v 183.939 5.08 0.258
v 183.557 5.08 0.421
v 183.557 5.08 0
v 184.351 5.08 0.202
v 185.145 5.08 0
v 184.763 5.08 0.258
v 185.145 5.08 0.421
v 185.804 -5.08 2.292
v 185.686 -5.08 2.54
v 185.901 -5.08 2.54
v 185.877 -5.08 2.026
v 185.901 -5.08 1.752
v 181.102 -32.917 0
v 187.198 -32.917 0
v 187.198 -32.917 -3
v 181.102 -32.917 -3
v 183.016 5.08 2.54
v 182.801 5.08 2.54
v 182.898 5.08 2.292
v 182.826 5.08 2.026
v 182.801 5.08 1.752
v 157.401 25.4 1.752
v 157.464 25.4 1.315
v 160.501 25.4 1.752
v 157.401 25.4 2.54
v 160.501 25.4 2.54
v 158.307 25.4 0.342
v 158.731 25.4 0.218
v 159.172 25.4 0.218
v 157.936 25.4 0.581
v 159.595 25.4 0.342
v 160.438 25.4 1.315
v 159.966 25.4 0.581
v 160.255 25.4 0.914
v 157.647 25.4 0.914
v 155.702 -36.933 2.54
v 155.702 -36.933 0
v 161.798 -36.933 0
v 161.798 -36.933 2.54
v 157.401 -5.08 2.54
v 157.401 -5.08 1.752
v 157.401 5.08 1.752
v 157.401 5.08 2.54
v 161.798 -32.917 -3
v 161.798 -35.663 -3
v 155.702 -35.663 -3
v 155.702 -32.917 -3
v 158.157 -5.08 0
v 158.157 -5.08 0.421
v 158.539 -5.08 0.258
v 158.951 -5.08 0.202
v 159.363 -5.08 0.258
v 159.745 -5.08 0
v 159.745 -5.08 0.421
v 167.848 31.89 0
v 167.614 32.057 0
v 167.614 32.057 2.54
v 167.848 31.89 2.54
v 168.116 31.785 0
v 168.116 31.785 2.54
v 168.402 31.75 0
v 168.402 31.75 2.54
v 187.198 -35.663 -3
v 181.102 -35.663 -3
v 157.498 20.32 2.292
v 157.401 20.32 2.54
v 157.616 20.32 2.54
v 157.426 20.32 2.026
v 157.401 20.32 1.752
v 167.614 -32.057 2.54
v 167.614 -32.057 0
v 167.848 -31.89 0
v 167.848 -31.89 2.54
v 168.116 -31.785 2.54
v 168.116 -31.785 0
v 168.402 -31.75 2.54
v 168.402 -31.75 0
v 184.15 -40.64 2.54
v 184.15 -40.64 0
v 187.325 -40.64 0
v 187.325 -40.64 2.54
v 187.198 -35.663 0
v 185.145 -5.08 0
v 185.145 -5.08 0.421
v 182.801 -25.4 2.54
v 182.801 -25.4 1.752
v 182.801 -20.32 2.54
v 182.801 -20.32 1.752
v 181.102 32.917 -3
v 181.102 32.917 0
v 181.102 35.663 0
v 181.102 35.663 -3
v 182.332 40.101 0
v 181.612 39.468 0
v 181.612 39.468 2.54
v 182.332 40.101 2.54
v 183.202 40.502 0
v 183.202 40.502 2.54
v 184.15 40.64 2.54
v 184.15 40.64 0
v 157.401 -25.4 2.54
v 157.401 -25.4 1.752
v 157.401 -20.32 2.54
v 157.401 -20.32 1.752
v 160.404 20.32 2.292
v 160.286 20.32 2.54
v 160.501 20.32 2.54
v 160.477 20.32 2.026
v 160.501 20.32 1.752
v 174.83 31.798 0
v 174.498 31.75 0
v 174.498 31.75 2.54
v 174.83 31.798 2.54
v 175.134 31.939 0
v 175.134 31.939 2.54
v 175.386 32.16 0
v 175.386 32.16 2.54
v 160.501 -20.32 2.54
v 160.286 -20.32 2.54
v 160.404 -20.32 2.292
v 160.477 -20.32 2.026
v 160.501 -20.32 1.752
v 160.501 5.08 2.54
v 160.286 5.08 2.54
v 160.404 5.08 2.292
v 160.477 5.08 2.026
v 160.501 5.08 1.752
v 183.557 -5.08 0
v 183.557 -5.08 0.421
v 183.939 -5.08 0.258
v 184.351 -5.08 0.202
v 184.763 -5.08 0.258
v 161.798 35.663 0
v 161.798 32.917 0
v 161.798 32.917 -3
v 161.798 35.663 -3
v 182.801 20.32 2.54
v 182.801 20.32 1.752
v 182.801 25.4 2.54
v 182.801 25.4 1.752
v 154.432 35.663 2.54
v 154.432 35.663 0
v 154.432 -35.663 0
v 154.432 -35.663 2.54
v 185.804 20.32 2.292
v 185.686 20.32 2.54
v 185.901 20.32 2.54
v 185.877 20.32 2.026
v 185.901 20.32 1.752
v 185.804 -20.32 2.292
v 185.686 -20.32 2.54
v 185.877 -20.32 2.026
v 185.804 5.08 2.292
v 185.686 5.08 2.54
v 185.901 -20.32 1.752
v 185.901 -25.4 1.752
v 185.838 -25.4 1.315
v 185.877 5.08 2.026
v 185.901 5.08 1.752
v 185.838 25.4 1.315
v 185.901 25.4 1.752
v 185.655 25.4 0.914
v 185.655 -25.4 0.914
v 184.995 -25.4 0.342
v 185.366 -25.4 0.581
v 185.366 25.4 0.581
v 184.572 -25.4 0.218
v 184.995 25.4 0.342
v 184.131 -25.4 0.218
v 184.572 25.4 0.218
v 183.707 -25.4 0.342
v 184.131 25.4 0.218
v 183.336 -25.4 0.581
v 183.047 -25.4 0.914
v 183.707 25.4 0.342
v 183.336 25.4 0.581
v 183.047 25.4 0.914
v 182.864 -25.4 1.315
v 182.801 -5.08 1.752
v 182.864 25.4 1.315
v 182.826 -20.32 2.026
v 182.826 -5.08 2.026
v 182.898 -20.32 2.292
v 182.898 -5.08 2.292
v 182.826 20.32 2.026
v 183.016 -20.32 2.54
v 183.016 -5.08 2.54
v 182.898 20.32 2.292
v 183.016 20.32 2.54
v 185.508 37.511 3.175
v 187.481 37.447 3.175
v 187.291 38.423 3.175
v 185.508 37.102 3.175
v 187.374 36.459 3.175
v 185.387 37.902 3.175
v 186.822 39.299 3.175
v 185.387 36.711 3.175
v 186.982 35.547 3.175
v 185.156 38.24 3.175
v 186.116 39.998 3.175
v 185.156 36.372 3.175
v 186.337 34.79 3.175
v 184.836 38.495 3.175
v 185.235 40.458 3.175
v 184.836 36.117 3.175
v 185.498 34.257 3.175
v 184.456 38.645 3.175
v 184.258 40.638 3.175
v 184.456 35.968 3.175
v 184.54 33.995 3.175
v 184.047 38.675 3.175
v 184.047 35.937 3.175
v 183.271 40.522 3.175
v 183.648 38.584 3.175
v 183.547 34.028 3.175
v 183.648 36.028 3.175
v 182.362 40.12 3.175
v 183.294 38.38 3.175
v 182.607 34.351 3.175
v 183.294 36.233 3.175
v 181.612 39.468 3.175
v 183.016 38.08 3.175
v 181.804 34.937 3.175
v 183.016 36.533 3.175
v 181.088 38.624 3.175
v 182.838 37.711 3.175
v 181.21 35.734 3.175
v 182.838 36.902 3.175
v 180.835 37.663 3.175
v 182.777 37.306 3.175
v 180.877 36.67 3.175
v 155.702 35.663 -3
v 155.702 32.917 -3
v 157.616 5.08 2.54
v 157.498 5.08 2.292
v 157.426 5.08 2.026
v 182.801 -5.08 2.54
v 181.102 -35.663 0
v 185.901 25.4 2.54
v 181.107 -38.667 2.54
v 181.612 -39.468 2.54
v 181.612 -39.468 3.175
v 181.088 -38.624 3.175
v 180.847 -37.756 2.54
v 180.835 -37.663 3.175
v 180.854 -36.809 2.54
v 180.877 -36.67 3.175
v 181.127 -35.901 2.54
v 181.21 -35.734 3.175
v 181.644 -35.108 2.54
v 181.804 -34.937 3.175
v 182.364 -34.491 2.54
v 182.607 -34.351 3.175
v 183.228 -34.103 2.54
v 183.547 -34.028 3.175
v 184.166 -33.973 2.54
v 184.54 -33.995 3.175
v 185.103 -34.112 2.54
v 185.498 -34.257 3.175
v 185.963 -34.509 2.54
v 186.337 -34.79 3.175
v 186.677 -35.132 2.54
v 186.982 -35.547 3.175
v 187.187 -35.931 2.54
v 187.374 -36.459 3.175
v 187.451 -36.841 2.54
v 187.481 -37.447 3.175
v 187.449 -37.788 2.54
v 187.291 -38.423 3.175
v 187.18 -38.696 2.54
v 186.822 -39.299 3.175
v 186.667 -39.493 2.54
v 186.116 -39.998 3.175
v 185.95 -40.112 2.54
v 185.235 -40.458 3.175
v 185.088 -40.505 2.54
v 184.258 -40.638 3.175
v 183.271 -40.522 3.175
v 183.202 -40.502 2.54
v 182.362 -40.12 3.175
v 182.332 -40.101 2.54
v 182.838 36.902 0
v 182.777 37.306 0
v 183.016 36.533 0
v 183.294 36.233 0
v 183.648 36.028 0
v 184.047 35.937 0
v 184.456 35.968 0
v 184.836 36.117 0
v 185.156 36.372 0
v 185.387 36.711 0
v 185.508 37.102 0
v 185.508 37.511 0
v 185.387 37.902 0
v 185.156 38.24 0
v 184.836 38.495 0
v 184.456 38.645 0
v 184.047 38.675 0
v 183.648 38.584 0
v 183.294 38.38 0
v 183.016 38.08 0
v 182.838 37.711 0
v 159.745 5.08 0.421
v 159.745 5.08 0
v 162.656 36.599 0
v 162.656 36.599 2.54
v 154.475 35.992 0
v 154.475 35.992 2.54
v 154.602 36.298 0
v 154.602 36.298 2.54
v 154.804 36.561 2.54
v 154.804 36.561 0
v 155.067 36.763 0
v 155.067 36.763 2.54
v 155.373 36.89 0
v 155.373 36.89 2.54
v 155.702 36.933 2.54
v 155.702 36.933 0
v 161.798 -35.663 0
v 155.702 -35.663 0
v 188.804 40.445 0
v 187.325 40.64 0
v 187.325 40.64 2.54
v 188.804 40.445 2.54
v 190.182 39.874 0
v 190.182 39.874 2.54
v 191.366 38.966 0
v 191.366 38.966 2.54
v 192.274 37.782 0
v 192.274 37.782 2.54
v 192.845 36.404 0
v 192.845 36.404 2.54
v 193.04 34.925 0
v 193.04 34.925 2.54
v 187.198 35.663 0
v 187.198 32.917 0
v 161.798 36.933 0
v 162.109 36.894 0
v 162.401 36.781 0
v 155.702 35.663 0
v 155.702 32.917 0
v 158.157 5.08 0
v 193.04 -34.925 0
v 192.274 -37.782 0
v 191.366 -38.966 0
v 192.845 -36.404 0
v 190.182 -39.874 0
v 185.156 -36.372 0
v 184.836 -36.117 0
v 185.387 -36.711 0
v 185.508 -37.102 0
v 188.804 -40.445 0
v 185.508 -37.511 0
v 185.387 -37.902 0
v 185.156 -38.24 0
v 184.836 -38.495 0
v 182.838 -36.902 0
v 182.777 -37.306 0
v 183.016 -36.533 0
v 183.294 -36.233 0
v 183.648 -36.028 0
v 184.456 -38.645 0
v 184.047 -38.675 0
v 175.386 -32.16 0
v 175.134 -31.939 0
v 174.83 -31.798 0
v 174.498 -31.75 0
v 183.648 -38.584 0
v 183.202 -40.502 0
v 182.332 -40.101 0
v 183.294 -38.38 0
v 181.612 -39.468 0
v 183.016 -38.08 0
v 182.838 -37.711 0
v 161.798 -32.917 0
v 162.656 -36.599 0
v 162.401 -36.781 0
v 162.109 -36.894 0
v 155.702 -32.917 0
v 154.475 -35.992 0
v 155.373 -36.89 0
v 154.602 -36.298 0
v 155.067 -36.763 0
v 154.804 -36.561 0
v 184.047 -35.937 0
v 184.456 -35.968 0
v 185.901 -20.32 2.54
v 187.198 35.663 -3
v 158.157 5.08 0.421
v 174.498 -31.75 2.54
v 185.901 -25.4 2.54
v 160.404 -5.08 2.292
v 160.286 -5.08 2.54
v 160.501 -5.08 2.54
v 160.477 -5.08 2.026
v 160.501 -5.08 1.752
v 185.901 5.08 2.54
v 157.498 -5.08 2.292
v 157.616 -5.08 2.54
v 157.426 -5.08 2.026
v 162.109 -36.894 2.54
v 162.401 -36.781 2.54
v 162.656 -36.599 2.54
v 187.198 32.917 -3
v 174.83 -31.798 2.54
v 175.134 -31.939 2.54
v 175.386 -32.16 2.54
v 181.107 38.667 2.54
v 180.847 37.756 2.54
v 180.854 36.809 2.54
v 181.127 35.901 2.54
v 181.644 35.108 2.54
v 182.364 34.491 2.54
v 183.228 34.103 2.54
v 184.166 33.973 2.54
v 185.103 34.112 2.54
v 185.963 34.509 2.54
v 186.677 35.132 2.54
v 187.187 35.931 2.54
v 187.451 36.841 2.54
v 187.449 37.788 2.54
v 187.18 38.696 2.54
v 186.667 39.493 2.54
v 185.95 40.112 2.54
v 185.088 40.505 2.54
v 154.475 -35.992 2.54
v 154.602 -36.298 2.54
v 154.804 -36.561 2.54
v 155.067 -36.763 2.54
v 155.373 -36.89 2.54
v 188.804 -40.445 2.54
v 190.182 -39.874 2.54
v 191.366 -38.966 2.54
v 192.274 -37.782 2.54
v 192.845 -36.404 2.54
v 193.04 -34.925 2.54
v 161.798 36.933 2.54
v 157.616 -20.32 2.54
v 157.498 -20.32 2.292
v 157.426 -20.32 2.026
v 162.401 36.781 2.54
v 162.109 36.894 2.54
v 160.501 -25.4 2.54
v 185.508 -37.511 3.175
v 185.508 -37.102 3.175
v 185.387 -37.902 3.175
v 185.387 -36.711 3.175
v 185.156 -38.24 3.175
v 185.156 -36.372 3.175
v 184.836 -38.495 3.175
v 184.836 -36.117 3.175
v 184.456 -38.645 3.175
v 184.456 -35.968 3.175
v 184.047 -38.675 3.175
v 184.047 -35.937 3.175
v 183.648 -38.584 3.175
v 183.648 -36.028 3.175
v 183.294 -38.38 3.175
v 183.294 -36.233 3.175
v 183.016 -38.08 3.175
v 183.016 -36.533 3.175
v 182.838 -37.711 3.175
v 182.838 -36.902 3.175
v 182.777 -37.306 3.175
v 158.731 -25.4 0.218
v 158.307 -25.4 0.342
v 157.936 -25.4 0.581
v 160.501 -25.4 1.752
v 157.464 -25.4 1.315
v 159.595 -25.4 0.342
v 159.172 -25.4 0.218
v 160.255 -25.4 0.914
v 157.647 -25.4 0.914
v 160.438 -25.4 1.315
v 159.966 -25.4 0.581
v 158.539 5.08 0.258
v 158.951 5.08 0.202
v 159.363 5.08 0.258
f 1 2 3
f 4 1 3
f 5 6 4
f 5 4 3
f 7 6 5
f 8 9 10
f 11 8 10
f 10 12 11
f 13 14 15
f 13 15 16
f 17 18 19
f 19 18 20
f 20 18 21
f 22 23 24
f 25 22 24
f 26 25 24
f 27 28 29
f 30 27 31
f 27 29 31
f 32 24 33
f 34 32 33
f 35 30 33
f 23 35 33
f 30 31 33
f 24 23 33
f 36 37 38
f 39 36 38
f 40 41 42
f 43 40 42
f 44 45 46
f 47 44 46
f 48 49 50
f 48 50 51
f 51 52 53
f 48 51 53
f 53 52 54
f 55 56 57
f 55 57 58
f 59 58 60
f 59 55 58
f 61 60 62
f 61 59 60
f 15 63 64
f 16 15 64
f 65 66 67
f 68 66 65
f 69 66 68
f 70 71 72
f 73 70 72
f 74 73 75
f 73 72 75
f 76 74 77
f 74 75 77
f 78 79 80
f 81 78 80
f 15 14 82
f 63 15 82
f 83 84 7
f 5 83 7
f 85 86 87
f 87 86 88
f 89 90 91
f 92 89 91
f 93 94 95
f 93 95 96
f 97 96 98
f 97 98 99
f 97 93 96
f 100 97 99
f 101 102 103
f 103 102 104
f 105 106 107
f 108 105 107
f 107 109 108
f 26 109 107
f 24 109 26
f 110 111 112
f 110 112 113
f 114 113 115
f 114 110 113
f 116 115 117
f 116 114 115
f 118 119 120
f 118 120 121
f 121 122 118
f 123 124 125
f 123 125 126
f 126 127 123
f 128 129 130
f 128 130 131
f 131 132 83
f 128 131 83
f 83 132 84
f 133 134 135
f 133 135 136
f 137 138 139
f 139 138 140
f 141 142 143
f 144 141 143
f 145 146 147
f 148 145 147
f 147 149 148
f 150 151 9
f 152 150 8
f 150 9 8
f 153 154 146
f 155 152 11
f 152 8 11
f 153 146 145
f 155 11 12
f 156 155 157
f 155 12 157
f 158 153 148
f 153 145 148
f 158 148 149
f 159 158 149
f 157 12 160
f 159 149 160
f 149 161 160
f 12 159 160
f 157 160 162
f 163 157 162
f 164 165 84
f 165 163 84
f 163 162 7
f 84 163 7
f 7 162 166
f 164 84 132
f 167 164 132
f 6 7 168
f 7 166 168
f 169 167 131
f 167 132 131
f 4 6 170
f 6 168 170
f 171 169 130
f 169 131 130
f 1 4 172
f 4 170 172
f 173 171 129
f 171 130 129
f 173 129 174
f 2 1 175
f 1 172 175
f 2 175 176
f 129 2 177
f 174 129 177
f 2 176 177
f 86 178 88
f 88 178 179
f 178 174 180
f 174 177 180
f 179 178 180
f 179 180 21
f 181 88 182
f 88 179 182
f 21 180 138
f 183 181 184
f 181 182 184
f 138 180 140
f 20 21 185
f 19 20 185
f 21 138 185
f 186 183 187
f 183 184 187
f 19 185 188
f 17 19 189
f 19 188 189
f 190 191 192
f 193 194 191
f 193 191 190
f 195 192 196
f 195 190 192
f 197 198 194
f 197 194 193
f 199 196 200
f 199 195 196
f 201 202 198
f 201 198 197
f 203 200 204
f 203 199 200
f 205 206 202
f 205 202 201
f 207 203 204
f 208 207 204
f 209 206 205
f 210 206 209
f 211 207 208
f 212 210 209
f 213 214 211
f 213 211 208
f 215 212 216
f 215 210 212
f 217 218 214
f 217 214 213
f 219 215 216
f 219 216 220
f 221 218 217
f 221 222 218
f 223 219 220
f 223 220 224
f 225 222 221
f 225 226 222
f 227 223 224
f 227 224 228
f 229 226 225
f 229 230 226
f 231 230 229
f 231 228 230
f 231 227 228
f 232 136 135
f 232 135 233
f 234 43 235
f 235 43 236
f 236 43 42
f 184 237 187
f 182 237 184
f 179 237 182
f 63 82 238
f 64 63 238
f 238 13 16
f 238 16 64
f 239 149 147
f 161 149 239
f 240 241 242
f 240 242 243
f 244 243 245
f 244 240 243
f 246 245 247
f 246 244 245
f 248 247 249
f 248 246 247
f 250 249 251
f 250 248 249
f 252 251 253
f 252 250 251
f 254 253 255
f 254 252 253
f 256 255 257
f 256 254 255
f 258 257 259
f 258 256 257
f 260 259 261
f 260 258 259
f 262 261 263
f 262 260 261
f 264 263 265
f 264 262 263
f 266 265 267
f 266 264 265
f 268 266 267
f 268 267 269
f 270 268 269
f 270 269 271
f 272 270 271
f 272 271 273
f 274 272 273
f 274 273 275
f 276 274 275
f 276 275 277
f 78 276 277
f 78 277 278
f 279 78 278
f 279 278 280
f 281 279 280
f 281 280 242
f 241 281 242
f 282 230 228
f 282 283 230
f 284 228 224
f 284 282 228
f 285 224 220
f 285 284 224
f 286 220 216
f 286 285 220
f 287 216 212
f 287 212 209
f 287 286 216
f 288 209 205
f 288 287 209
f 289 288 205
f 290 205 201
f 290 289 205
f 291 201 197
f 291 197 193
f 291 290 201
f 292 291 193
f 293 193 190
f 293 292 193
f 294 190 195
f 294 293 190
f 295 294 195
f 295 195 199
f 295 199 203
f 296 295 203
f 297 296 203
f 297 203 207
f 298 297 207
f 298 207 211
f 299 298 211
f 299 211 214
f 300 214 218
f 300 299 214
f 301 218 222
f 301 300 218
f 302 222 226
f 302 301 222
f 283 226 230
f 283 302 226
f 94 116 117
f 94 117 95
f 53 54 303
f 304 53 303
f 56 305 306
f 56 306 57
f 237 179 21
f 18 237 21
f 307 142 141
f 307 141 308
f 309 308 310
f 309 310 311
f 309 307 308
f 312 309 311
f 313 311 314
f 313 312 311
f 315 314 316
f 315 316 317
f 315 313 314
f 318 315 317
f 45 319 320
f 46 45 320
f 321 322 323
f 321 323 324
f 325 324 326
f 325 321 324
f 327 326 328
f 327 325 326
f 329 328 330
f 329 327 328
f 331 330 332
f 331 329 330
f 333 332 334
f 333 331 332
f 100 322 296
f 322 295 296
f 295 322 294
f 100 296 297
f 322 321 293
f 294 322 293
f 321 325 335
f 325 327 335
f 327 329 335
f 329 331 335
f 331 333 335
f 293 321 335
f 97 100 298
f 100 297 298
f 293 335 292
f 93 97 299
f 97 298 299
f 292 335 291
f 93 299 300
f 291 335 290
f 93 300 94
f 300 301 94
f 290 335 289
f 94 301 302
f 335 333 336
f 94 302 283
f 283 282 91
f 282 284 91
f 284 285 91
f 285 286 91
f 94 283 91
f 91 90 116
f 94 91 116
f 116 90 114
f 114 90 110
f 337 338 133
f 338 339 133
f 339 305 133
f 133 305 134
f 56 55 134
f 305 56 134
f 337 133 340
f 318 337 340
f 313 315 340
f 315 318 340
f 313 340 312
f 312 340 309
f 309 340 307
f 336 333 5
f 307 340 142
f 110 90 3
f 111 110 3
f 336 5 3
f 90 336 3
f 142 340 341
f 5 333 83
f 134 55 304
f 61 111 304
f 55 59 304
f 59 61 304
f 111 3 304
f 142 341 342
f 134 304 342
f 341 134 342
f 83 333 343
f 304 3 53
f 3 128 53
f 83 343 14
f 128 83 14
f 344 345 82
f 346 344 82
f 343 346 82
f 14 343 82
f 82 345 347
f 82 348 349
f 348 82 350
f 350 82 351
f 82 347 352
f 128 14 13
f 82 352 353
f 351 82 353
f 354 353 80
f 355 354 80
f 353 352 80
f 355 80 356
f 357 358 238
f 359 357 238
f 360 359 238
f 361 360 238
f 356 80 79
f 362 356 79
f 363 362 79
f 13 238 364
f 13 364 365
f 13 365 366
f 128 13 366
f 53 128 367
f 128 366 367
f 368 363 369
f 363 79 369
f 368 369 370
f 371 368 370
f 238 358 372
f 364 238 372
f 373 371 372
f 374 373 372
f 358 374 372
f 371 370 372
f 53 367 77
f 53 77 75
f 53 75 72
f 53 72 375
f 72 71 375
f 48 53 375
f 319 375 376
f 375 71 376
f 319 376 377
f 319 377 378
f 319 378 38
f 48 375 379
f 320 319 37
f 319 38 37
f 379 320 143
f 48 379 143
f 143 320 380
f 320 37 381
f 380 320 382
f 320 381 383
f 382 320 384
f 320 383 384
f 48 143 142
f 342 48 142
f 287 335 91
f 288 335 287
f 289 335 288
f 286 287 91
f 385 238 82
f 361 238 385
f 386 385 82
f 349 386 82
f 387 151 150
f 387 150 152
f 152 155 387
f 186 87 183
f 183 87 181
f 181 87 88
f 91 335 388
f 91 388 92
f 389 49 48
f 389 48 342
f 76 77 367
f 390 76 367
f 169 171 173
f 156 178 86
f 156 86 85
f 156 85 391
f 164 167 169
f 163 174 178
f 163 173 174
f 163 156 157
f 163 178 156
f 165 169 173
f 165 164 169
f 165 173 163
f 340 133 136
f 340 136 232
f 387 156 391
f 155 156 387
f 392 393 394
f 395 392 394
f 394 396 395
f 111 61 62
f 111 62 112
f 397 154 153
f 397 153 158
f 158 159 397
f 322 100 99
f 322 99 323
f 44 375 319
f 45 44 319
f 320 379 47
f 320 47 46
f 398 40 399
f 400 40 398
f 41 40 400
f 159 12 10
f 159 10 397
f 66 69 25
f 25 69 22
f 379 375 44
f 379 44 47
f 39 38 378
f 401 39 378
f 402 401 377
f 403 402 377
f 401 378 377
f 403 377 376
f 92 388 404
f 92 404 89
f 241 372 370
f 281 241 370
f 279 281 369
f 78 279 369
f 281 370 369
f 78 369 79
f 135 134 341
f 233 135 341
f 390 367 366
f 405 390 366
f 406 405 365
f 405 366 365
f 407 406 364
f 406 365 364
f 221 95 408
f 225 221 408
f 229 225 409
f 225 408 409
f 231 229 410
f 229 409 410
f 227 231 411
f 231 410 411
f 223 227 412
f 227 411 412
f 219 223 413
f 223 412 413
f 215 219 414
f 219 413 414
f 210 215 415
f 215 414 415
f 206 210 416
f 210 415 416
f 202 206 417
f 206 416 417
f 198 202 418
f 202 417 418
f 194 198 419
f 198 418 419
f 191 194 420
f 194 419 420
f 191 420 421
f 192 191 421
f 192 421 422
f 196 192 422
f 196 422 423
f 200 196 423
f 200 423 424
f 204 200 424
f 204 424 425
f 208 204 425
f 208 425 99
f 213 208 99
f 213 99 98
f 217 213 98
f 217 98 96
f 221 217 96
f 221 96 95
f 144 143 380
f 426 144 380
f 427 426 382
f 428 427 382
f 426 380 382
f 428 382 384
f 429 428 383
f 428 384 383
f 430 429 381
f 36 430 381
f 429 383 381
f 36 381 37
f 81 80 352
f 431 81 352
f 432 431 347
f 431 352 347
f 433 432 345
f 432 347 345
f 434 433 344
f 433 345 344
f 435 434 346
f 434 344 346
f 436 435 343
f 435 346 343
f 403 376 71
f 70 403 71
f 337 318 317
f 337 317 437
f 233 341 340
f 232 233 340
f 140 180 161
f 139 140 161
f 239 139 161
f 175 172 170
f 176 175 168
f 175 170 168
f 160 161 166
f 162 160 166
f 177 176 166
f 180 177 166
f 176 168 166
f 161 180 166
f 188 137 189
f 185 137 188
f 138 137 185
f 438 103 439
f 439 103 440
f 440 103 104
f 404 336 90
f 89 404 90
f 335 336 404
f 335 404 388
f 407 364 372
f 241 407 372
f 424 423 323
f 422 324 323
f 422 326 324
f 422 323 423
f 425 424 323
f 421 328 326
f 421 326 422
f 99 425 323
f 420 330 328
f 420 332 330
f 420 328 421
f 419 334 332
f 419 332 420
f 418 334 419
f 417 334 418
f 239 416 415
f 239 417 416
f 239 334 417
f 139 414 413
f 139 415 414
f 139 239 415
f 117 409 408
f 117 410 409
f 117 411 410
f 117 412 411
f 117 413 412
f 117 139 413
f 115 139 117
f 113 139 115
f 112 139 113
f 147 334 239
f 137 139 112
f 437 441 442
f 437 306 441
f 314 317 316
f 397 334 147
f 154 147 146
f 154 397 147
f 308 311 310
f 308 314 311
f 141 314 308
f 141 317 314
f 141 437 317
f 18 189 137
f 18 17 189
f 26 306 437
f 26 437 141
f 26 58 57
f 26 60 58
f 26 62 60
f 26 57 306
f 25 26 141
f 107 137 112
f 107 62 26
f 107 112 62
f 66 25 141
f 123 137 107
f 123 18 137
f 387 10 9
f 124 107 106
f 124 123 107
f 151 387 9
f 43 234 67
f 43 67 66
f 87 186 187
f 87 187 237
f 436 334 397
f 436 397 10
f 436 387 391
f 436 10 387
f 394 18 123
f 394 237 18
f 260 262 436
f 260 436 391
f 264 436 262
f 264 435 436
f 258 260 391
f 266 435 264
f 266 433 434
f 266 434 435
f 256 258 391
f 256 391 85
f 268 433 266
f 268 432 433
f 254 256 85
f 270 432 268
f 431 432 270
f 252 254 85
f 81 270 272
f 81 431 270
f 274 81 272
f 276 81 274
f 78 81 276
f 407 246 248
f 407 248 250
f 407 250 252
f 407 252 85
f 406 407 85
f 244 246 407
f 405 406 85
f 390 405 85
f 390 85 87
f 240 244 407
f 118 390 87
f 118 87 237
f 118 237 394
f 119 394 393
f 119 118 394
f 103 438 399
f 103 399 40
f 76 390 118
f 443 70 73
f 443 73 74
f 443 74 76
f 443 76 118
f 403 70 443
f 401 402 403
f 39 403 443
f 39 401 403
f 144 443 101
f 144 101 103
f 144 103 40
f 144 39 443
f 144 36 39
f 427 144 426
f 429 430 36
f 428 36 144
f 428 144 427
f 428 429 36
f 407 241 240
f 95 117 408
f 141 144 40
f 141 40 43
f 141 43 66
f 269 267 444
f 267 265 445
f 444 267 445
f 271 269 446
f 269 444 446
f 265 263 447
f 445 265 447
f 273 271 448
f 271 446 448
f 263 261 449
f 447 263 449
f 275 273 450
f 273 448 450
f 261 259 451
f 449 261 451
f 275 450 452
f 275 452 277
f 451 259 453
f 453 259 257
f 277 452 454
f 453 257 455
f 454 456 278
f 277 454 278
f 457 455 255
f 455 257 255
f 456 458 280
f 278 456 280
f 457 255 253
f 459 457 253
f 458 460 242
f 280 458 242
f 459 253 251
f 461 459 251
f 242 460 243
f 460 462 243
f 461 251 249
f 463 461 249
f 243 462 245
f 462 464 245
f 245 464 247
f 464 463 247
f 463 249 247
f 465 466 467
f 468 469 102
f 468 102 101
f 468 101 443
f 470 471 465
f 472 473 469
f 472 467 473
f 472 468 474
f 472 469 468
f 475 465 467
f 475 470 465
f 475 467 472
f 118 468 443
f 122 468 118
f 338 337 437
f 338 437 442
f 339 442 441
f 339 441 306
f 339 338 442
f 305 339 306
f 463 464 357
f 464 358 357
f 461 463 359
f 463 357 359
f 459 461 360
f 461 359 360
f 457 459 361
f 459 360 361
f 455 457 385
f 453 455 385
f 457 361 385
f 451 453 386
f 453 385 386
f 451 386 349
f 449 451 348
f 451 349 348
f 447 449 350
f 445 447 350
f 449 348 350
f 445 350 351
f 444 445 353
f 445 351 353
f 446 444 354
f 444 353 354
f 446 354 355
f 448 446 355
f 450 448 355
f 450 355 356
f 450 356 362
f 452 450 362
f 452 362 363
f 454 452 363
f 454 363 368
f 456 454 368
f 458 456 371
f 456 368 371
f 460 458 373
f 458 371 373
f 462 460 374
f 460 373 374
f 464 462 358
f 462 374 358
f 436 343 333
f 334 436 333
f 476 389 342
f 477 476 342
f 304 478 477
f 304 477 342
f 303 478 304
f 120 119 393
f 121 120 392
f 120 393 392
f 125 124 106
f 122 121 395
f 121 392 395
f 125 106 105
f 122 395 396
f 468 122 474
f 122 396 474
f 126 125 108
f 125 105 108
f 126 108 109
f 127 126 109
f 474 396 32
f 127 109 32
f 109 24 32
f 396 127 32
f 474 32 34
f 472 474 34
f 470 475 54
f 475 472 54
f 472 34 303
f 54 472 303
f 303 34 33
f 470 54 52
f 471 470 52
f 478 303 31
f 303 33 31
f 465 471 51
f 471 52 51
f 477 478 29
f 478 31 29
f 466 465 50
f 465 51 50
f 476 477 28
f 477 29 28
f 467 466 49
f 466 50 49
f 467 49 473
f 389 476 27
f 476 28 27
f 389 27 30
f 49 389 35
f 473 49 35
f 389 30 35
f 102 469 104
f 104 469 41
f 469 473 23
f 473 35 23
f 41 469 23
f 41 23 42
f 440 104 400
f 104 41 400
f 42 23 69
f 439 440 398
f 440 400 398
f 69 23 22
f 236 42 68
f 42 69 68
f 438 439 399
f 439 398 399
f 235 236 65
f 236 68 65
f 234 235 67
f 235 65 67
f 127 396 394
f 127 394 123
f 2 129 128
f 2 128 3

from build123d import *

# Parameters (mm, degrees)
SKETCH3_R           = 1.373
DOWEL_BODIES_DEPTH  = 13
BOSS_EXTRUDE3_DEPTH = 2.54
SKETCH5_W           = 6.096
SKETCH5_H           = 2.746000096
BOSS_EXTRUDE4_DEPTH = 3
SKETCH6_R           = 3.33375
SKETCH6_R_2         = 1.373
BOSS_EXTRUDE7_DEPTH = 0.635
SKETCH8_R           = 1.55
CUT_EXTRUDE1_DEPTH  = 25.4
CUT_EXTRUDE2_REACH  = 199.349
SKETCH9_W           = 1.5875
SKETCH9_H           = 10.16
CUT_EXTRUDE3_START  = -0.788
SKETCH10_W          = 3.1
SKETCH10_H          = 5.08
SKETCH10_H_2        = 10.16
CUT_EXTRUDE3_DEPTH  = 0.788
LPATTERN1_COUNT     = 2
LPATTERN1_PITCH     = 25.4


with BuildPart() as part:
    # Sketch3 → Dowel Bodies (new body)
    with BuildSketch(Plane.XY):
        with Locations(Location((184.15, 37.30625, 0), (0, 0, 180))):
            Circle(SKETCH3_R)
    extrude(amount=DOWEL_BODIES_DEPTH)


with BuildPart() as body_2:
    # Sketch4 → Boss-Extrude3 (new body)
    with BuildSketch(Plane.XY):
        with BuildLine():
            Line((168.402, 31.75), (174.498, 31.75))
            ThreePointArc((174.498, 31.75), (174.987232511, 31.857499863), (175.386332323, 32.160194447))
            Line((175.386332323, 32.160194447), (181.612315337, 39.468204119))
            ThreePointArc((181.612315337, 39.468204119), (182.752417351, 40.332906869), (184.15, 40.64))
            Line((184.15, 40.64), (187.325, 40.64))
            ThreePointArc((187.325, 40.64), (191.366115254, 38.966115254), (193.04, 34.925))
            Line((193.04, 34.925), (193.04, 0))
            Line((193.04, 0), (154.432, 0))
            Line((154.432, 0), (154.432, 35.663000048))
            ThreePointArc((154.432, 35.663000048), (154.803974388, 36.56102566), (155.702, 36.933000048))
            Line((155.702, 36.933000048), (161.798, 36.933000048))
            ThreePointArc((161.798, 36.933000048), (162.258293304, 36.846651211), (162.655994809, 36.599346622))
            Line((162.655994809, 36.599346622), (167.613590629, 32.056593332))
            ThreePointArc((167.613590629, 32.056593332), (167.979037588, 31.829345739), (168.402, 31.75))
        make_face()
    extrude(amount=BOSS_EXTRUDE3_DEPTH)

    # Combine1: cut part
    add(part.part, mode=Mode.SUBTRACT)

    # Sketch5 → Boss-Extrude4 (add)
    with BuildSketch(Plane(origin=(0, 0, 0), x_dir=(-1, 0, 0), z_dir=(0, 0, -1))):
        with Locations((-184.15, 34.29)):
            Rectangle(SKETCH5_W, SKETCH5_H)
        with Locations((-158.75, 34.29)):
            Rectangle(SKETCH5_W, SKETCH5_H)
    extrude(amount=BOSS_EXTRUDE4_DEPTH)

    # Sketch6 → Boss-Extrude7 (add)
    with BuildSketch(Plane.XY.offset(2.54)):
        with Locations(Location((184.15, 37.30625, 0), (0, 0, 139.571007131))):
            Circle(SKETCH6_R)
        with Locations(Location((184.15, 37.30625, 0), (0, 0, 180))):
            Circle(SKETCH6_R_2, mode=Mode.SUBTRACT)
    extrude(amount=BOSS_EXTRUDE7_DEPTH)

    # Mirror3: body 2 across plane


with BuildPart() as body_2_1:
    add(body_2.part)
    add(body_2.part.mirror(Plane.ZX))

    # Sketch8 → Cut-Extrude1 (cut, symmetric)
    with BuildSketch(Plane(origin=(0, 0, 0), x_dir=(1, 0, 0), z_dir=(0, 1, 0))):
        with Locations((158.951107585, -1.752)):
            Circle(SKETCH8_R)
    cut_extrude1 = extrude(amount=CUT_EXTRUDE1_DEPTH, both=True, mode=Mode.SUBTRACT)

    # Sketch9 → Cut-Extrude2 (cut, up to next)
    with BuildSketch(Plane.XY.offset(2.54), mode=Mode.PRIVATE) as cut_extrude2_sk1:
        with Locations((158.951107585, 0)):
            Rectangle(SKETCH9_W, SKETCH9_H)
    cut_extrude2_tool1 = extrude(cut_extrude2_sk1.sketch, amount=-CUT_EXTRUDE2_REACH, mode=Mode.PRIVATE) & body_2_1.part
    cut_extrude2 = cut_extrude2_tool1.solids().sort_by_distance((158.951108, 0, 2.54))[0]
    add(cut_extrude2, mode=Mode.SUBTRACT)

    # Sketch10 → Cut-Extrude3 (cut)
    with BuildSketch(Plane.XY.offset(2.54).offset(CUT_EXTRUDE3_START)):
        with Locations((158.951107585, 22.86)):
            Rectangle(SKETCH10_W, SKETCH10_H)
        with Locations((158.951107585, 0)):
            Rectangle(SKETCH10_W, SKETCH10_H_2)
        with Locations((158.951107585, -22.86)):
            Rectangle(SKETCH10_W, SKETCH10_H)
    cut_extrude3 = extrude(amount=CUT_EXTRUDE3_DEPTH, mode=Mode.SUBTRACT)

    # LPattern1: Cut-Extrude1, Cut-Extrude2, Cut-Extrude3 ×2
    with Locations(*[(i * LPATTERN1_PITCH, 0, 0) for i in range(1, LPATTERN1_COUNT)]):
        add(cut_extrude1, mode=Mode.SUBTRACT)
        add(cut_extrude2, mode=Mode.SUBTRACT)
        add(cut_extrude3, mode=Mode.SUBTRACT)


solid = body_2_1.part
